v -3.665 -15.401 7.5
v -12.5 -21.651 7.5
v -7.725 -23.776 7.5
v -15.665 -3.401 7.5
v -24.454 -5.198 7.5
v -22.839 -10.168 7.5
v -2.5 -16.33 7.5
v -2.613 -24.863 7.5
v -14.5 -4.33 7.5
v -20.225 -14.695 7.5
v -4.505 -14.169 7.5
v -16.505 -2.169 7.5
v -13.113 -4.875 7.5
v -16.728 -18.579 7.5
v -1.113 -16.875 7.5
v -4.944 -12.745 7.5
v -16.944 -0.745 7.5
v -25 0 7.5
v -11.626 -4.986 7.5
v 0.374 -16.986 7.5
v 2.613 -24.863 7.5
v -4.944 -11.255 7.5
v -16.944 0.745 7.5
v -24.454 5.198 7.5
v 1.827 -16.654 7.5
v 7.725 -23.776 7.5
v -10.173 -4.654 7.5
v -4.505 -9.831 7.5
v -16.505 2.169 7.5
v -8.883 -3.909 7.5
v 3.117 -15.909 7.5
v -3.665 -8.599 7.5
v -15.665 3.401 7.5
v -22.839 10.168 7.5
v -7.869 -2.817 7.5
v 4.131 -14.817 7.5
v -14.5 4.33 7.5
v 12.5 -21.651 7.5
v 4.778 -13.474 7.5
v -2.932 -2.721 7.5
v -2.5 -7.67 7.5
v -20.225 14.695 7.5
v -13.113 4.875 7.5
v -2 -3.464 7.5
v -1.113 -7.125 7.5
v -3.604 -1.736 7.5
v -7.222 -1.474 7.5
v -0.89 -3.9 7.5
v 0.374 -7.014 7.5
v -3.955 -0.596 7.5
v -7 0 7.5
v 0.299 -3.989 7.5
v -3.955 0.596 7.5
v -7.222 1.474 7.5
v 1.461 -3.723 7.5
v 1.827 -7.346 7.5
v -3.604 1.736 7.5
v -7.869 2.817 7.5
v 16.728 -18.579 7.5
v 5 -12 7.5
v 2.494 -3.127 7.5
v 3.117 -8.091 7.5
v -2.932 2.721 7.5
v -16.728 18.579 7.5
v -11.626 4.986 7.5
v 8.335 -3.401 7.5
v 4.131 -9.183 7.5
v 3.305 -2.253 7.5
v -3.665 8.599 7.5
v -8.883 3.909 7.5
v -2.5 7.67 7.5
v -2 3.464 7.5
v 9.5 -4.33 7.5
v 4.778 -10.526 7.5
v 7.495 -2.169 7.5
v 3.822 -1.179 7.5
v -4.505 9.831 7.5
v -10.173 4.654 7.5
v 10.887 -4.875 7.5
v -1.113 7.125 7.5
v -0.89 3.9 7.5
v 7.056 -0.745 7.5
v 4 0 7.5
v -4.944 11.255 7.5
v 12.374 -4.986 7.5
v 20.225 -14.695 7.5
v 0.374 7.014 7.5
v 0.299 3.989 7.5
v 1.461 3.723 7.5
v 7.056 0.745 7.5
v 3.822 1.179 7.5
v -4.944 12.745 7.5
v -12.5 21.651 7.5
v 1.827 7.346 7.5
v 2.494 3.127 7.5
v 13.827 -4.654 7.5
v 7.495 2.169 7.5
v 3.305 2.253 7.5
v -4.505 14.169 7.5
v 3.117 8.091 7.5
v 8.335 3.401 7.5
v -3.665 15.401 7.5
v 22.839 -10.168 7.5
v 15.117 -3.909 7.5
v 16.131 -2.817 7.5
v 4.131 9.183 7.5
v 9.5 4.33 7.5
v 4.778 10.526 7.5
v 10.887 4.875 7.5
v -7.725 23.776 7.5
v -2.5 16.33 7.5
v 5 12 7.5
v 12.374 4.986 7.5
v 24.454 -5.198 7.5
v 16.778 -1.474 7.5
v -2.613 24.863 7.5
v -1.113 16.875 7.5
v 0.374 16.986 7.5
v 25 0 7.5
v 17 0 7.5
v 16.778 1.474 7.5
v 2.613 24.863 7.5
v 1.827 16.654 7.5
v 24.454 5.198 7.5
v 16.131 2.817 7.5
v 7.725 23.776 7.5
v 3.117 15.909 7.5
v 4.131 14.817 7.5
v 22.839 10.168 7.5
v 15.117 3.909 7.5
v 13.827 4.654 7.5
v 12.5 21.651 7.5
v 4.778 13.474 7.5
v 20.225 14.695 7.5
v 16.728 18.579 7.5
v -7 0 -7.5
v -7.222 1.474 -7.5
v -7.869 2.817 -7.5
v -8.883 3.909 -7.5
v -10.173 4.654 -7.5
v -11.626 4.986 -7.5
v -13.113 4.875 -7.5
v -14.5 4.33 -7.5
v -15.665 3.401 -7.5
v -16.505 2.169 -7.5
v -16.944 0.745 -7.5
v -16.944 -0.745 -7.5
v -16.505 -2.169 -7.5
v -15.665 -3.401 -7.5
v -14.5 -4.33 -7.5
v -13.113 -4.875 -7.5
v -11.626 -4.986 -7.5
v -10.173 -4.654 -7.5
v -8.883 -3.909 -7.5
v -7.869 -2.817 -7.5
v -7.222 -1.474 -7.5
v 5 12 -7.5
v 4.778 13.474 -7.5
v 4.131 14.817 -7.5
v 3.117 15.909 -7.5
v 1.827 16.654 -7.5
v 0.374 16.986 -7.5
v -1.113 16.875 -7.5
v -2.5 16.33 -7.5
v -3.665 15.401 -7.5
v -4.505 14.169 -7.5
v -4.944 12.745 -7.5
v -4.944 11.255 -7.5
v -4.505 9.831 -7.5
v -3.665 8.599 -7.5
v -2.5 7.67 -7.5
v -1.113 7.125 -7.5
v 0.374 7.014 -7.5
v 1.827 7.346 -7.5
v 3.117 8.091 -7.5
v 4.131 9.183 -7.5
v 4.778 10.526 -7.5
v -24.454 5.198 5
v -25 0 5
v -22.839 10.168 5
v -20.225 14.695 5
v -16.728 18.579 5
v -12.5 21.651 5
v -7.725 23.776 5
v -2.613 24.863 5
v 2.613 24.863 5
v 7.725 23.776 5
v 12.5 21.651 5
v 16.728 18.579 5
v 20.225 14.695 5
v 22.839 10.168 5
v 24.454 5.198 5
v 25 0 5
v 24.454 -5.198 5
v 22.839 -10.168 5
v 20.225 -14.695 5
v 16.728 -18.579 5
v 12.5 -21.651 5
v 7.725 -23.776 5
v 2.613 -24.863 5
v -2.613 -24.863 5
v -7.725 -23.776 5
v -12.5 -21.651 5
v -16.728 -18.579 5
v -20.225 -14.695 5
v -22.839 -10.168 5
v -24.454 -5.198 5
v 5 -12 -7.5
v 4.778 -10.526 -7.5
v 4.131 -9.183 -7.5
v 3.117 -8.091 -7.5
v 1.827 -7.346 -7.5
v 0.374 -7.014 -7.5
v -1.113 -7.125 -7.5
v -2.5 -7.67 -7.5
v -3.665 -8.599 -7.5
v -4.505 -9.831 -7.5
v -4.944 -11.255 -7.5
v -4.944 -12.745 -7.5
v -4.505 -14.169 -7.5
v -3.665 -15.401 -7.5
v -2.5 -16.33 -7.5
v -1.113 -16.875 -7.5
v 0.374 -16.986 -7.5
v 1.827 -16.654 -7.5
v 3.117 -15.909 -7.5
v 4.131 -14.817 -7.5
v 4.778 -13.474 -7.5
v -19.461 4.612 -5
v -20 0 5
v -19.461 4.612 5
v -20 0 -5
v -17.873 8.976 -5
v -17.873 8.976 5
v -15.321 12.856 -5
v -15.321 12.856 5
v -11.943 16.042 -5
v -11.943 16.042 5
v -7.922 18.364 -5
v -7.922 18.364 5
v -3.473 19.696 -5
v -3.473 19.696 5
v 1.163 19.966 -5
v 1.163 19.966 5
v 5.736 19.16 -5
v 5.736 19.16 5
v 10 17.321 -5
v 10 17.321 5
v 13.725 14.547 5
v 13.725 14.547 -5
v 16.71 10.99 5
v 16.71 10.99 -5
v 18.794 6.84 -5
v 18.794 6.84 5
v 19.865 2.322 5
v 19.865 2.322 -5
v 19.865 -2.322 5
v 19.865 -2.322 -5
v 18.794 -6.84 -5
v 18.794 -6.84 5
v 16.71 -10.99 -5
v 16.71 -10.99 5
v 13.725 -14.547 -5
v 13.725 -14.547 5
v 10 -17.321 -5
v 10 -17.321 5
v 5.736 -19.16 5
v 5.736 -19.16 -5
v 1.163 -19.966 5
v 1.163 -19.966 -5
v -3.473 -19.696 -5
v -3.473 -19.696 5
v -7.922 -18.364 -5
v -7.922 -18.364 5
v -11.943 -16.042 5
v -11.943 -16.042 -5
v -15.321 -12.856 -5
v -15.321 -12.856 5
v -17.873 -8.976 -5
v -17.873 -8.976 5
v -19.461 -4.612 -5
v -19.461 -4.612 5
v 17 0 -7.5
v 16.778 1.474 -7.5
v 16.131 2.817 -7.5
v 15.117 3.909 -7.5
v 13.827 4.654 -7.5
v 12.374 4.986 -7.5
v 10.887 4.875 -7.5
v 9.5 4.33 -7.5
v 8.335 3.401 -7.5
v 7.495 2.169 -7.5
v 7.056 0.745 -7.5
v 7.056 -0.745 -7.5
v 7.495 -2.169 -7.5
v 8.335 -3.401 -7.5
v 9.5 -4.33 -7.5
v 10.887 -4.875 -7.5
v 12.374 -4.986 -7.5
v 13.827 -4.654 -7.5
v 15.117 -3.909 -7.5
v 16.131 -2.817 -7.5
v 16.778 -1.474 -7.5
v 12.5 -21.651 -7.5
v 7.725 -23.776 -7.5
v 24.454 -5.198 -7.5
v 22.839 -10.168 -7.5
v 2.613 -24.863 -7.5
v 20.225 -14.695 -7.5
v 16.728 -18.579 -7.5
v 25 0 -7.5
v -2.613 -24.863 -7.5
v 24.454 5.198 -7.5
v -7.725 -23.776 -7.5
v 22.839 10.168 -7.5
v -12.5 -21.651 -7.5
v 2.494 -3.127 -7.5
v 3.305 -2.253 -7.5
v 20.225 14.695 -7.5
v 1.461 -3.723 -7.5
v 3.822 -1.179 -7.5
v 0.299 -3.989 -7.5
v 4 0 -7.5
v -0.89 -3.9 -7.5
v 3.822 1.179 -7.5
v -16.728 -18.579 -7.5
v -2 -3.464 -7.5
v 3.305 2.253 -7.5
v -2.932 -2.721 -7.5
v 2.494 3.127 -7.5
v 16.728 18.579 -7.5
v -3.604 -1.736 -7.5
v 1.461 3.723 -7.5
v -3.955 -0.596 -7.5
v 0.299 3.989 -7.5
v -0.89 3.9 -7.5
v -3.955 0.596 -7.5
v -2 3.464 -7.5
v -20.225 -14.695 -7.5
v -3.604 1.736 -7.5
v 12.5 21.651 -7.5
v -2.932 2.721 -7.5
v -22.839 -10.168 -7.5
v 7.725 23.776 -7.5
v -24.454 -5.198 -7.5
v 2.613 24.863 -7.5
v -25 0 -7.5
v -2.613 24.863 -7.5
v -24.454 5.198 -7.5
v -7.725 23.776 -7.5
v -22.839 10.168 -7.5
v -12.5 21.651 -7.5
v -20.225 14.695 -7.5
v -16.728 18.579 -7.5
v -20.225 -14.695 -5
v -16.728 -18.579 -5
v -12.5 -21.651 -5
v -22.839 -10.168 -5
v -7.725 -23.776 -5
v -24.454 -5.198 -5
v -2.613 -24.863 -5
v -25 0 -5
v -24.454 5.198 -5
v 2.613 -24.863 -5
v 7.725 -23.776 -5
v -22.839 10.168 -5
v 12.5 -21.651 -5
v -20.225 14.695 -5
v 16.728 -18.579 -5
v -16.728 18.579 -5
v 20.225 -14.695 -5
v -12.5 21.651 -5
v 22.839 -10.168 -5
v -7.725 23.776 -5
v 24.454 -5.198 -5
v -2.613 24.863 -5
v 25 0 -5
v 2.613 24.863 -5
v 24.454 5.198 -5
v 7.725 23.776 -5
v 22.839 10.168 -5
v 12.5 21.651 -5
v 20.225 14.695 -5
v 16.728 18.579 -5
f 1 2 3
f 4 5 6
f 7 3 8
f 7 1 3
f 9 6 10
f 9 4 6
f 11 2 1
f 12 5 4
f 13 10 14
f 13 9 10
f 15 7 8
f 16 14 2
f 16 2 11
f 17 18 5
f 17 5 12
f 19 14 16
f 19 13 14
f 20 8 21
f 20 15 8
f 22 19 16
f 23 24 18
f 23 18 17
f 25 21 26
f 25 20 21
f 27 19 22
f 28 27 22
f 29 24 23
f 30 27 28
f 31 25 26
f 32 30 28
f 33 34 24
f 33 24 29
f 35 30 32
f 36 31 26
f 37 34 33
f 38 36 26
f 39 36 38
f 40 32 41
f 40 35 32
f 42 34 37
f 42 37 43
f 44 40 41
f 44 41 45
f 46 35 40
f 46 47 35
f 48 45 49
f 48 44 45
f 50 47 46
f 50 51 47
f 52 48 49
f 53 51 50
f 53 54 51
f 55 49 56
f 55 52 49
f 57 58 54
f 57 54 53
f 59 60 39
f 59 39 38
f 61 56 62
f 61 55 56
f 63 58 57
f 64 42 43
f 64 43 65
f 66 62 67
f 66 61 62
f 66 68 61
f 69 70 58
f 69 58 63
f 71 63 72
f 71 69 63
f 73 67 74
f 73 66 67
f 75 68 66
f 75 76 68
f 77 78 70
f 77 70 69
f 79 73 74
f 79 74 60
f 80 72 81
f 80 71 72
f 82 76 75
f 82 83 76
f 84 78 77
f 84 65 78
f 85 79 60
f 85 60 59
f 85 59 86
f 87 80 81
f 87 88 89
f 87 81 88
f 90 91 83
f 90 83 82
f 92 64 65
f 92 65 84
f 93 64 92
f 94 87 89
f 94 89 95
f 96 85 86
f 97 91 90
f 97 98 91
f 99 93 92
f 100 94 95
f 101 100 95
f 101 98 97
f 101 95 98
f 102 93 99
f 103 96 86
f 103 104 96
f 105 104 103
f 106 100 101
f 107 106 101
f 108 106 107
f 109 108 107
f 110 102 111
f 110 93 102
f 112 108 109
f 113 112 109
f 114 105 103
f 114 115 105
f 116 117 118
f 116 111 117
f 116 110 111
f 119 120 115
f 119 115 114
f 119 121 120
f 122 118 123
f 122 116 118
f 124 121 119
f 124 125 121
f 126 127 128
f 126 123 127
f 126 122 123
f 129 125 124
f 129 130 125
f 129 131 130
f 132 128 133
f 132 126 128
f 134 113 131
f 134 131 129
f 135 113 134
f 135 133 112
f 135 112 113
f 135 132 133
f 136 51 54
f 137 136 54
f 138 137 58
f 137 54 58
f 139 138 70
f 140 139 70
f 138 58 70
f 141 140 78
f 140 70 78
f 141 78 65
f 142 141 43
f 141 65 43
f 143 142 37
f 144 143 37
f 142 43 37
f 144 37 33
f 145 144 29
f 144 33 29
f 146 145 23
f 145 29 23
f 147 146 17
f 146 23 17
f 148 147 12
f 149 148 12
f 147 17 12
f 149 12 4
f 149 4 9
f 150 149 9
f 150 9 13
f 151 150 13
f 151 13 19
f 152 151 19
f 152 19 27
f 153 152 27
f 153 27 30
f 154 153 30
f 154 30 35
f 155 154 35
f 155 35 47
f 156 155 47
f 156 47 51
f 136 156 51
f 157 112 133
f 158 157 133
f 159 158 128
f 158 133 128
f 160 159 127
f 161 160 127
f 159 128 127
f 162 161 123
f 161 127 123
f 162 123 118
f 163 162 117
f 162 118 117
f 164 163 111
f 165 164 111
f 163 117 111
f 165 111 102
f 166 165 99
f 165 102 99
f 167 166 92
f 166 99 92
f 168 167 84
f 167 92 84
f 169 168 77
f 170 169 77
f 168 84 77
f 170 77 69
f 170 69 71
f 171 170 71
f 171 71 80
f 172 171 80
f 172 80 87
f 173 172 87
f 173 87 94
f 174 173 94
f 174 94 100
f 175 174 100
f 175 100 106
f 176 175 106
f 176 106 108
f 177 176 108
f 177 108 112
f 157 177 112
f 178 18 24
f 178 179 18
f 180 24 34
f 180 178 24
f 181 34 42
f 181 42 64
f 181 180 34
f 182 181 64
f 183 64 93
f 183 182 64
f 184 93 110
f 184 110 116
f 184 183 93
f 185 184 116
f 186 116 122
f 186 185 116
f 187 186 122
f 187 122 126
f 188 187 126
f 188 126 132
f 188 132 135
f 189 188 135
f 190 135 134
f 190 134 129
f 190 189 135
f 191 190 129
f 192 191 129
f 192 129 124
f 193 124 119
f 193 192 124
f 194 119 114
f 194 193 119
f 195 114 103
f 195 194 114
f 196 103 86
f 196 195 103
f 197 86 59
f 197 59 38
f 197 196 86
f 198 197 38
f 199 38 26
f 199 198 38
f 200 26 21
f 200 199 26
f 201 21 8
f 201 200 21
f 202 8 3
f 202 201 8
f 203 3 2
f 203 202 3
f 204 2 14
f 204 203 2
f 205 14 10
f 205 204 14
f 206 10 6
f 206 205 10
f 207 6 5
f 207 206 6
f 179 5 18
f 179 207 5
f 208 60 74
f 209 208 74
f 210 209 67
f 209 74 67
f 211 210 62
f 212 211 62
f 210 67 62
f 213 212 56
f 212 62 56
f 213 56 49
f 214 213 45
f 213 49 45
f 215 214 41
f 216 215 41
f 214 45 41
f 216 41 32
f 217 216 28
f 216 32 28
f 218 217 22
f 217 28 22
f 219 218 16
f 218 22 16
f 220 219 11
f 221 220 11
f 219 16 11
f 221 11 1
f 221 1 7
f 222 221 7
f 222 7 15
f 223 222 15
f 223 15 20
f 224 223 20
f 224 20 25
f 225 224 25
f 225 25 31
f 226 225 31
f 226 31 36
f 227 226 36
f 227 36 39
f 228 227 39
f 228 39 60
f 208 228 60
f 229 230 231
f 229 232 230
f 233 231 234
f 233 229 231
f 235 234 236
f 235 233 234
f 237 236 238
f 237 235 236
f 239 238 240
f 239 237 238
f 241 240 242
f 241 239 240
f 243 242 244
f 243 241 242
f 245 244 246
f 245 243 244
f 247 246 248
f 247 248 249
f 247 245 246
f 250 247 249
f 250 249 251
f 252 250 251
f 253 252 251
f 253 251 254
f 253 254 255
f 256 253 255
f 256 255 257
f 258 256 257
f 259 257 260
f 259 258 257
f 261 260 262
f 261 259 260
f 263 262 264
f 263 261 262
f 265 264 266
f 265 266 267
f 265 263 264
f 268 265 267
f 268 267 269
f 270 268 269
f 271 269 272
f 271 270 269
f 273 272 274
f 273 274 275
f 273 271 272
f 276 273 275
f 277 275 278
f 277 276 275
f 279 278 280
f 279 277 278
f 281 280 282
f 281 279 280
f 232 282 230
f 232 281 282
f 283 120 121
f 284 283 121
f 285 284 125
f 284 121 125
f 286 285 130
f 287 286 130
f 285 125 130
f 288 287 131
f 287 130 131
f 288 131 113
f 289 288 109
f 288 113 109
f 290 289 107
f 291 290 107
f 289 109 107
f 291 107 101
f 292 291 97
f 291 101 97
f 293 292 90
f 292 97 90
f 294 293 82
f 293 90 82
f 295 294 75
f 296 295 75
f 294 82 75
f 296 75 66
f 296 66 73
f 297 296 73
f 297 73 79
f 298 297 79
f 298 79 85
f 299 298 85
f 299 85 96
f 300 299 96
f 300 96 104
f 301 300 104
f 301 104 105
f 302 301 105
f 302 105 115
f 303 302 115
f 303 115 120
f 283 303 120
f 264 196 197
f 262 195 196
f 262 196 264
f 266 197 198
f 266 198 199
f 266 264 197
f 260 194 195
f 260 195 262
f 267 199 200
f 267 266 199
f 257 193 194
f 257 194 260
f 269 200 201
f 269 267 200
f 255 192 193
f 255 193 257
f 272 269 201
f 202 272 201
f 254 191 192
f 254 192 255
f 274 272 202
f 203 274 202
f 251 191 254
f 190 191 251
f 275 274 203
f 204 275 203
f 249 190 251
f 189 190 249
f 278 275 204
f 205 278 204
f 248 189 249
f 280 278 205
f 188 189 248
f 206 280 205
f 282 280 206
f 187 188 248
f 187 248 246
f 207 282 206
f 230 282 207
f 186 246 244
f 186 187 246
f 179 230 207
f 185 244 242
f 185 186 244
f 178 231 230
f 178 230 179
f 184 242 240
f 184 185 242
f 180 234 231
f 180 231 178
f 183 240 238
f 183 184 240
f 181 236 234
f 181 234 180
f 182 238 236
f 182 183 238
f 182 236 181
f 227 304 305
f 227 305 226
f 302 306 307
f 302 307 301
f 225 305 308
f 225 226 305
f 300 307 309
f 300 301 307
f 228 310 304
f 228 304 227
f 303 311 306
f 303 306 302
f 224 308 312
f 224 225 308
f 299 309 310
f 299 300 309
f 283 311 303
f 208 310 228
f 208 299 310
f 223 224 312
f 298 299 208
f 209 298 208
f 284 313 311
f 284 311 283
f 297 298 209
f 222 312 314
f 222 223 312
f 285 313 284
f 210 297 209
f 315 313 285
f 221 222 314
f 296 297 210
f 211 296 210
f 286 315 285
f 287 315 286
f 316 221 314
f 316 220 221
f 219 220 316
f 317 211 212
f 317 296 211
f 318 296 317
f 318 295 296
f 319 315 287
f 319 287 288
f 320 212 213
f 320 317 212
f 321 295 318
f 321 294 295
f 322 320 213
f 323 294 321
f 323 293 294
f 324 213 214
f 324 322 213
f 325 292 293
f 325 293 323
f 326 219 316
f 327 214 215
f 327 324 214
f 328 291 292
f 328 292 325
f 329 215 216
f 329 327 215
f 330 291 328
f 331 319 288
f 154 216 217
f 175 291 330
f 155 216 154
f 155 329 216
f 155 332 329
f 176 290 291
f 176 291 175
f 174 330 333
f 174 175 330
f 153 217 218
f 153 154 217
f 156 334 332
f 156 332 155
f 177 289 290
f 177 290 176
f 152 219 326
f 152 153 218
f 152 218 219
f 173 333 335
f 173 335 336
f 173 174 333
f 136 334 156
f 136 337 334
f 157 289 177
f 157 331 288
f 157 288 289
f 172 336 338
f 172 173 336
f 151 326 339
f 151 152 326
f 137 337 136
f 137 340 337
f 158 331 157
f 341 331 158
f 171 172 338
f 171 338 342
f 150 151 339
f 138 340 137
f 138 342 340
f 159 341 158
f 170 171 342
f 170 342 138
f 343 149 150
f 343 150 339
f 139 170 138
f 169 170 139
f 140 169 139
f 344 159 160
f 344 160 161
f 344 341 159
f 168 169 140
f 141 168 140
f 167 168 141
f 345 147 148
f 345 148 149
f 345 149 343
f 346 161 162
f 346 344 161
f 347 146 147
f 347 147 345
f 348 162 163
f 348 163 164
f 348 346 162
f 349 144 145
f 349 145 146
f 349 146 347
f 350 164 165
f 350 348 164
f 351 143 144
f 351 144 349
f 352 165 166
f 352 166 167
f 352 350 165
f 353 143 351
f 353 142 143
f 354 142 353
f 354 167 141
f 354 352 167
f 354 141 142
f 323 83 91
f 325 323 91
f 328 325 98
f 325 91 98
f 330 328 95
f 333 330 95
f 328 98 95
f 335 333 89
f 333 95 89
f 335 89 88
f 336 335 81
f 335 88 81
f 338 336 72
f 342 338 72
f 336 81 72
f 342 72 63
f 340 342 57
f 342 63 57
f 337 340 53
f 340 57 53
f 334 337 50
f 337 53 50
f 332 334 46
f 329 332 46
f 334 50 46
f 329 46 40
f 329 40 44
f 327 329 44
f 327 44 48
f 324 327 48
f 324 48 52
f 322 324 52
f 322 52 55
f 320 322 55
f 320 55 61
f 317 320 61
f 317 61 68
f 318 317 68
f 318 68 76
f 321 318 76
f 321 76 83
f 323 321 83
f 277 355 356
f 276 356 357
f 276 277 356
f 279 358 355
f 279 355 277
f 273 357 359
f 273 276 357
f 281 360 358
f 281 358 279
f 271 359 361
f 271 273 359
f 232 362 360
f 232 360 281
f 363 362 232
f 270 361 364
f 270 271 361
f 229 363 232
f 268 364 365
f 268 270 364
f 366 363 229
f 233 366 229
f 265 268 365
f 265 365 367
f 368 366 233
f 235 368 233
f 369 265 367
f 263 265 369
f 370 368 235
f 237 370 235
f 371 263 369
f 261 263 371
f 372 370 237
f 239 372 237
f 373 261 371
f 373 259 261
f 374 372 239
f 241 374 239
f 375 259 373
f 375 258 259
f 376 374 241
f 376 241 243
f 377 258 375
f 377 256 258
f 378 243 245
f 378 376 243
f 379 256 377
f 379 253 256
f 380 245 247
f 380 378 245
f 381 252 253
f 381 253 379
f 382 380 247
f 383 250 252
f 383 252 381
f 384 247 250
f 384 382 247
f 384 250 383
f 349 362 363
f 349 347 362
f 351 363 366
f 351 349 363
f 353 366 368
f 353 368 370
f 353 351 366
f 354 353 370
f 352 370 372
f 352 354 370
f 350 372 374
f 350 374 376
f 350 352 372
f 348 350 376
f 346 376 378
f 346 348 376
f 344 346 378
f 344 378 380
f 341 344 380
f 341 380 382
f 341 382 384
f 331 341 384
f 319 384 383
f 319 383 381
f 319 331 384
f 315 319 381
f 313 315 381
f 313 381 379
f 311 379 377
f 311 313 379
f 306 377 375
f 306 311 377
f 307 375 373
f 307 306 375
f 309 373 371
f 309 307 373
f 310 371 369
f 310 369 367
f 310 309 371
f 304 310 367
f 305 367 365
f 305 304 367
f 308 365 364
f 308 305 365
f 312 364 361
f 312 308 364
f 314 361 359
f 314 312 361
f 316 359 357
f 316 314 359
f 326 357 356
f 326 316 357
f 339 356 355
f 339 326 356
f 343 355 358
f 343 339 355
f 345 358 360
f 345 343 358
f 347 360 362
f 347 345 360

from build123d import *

# Parameters (mm, degrees)
F2_R     = 4
F3_DEPTH = 15.001
F4_R     = 5
F5_DEPTH = 15.001


with BuildPart() as f1:
    # F0 (on Front) → F1 (revolve)
    with BuildSketch(Plane.XZ):
        Polygon((0, -7.5), (0, 7.5), (-25, 7.5), (-25, 5), (-20, 5), (-20, -5), (-25, -5), (-25, -7.5), align=None)
    revolve(axis=Axis((0, 0, 0), (0, 0, -1)))

    # F2 (on face) → F3 (cut, through all)
    with BuildSketch(Plane.XY.offset(7.5)):
        Circle(F2_R)
    extrude(amount=-F3_DEPTH, mode=Mode.SUBTRACT)

    # F4 (on face) → F5 (cut, through all)
    with BuildSketch(Plane.XY.offset(7.5)):
        with Locations((-12, 0)):
            Circle(F4_R)
        with Locations((0, 12)):
            Circle(F4_R)
        with Locations((12, 0)):
            Circle(F4_R)
        with Locations((0, -12)):
            Circle(F4_R)
    extrude(amount=-F5_DEPTH, mode=Mode.SUBTRACT)


solid = f1.part
